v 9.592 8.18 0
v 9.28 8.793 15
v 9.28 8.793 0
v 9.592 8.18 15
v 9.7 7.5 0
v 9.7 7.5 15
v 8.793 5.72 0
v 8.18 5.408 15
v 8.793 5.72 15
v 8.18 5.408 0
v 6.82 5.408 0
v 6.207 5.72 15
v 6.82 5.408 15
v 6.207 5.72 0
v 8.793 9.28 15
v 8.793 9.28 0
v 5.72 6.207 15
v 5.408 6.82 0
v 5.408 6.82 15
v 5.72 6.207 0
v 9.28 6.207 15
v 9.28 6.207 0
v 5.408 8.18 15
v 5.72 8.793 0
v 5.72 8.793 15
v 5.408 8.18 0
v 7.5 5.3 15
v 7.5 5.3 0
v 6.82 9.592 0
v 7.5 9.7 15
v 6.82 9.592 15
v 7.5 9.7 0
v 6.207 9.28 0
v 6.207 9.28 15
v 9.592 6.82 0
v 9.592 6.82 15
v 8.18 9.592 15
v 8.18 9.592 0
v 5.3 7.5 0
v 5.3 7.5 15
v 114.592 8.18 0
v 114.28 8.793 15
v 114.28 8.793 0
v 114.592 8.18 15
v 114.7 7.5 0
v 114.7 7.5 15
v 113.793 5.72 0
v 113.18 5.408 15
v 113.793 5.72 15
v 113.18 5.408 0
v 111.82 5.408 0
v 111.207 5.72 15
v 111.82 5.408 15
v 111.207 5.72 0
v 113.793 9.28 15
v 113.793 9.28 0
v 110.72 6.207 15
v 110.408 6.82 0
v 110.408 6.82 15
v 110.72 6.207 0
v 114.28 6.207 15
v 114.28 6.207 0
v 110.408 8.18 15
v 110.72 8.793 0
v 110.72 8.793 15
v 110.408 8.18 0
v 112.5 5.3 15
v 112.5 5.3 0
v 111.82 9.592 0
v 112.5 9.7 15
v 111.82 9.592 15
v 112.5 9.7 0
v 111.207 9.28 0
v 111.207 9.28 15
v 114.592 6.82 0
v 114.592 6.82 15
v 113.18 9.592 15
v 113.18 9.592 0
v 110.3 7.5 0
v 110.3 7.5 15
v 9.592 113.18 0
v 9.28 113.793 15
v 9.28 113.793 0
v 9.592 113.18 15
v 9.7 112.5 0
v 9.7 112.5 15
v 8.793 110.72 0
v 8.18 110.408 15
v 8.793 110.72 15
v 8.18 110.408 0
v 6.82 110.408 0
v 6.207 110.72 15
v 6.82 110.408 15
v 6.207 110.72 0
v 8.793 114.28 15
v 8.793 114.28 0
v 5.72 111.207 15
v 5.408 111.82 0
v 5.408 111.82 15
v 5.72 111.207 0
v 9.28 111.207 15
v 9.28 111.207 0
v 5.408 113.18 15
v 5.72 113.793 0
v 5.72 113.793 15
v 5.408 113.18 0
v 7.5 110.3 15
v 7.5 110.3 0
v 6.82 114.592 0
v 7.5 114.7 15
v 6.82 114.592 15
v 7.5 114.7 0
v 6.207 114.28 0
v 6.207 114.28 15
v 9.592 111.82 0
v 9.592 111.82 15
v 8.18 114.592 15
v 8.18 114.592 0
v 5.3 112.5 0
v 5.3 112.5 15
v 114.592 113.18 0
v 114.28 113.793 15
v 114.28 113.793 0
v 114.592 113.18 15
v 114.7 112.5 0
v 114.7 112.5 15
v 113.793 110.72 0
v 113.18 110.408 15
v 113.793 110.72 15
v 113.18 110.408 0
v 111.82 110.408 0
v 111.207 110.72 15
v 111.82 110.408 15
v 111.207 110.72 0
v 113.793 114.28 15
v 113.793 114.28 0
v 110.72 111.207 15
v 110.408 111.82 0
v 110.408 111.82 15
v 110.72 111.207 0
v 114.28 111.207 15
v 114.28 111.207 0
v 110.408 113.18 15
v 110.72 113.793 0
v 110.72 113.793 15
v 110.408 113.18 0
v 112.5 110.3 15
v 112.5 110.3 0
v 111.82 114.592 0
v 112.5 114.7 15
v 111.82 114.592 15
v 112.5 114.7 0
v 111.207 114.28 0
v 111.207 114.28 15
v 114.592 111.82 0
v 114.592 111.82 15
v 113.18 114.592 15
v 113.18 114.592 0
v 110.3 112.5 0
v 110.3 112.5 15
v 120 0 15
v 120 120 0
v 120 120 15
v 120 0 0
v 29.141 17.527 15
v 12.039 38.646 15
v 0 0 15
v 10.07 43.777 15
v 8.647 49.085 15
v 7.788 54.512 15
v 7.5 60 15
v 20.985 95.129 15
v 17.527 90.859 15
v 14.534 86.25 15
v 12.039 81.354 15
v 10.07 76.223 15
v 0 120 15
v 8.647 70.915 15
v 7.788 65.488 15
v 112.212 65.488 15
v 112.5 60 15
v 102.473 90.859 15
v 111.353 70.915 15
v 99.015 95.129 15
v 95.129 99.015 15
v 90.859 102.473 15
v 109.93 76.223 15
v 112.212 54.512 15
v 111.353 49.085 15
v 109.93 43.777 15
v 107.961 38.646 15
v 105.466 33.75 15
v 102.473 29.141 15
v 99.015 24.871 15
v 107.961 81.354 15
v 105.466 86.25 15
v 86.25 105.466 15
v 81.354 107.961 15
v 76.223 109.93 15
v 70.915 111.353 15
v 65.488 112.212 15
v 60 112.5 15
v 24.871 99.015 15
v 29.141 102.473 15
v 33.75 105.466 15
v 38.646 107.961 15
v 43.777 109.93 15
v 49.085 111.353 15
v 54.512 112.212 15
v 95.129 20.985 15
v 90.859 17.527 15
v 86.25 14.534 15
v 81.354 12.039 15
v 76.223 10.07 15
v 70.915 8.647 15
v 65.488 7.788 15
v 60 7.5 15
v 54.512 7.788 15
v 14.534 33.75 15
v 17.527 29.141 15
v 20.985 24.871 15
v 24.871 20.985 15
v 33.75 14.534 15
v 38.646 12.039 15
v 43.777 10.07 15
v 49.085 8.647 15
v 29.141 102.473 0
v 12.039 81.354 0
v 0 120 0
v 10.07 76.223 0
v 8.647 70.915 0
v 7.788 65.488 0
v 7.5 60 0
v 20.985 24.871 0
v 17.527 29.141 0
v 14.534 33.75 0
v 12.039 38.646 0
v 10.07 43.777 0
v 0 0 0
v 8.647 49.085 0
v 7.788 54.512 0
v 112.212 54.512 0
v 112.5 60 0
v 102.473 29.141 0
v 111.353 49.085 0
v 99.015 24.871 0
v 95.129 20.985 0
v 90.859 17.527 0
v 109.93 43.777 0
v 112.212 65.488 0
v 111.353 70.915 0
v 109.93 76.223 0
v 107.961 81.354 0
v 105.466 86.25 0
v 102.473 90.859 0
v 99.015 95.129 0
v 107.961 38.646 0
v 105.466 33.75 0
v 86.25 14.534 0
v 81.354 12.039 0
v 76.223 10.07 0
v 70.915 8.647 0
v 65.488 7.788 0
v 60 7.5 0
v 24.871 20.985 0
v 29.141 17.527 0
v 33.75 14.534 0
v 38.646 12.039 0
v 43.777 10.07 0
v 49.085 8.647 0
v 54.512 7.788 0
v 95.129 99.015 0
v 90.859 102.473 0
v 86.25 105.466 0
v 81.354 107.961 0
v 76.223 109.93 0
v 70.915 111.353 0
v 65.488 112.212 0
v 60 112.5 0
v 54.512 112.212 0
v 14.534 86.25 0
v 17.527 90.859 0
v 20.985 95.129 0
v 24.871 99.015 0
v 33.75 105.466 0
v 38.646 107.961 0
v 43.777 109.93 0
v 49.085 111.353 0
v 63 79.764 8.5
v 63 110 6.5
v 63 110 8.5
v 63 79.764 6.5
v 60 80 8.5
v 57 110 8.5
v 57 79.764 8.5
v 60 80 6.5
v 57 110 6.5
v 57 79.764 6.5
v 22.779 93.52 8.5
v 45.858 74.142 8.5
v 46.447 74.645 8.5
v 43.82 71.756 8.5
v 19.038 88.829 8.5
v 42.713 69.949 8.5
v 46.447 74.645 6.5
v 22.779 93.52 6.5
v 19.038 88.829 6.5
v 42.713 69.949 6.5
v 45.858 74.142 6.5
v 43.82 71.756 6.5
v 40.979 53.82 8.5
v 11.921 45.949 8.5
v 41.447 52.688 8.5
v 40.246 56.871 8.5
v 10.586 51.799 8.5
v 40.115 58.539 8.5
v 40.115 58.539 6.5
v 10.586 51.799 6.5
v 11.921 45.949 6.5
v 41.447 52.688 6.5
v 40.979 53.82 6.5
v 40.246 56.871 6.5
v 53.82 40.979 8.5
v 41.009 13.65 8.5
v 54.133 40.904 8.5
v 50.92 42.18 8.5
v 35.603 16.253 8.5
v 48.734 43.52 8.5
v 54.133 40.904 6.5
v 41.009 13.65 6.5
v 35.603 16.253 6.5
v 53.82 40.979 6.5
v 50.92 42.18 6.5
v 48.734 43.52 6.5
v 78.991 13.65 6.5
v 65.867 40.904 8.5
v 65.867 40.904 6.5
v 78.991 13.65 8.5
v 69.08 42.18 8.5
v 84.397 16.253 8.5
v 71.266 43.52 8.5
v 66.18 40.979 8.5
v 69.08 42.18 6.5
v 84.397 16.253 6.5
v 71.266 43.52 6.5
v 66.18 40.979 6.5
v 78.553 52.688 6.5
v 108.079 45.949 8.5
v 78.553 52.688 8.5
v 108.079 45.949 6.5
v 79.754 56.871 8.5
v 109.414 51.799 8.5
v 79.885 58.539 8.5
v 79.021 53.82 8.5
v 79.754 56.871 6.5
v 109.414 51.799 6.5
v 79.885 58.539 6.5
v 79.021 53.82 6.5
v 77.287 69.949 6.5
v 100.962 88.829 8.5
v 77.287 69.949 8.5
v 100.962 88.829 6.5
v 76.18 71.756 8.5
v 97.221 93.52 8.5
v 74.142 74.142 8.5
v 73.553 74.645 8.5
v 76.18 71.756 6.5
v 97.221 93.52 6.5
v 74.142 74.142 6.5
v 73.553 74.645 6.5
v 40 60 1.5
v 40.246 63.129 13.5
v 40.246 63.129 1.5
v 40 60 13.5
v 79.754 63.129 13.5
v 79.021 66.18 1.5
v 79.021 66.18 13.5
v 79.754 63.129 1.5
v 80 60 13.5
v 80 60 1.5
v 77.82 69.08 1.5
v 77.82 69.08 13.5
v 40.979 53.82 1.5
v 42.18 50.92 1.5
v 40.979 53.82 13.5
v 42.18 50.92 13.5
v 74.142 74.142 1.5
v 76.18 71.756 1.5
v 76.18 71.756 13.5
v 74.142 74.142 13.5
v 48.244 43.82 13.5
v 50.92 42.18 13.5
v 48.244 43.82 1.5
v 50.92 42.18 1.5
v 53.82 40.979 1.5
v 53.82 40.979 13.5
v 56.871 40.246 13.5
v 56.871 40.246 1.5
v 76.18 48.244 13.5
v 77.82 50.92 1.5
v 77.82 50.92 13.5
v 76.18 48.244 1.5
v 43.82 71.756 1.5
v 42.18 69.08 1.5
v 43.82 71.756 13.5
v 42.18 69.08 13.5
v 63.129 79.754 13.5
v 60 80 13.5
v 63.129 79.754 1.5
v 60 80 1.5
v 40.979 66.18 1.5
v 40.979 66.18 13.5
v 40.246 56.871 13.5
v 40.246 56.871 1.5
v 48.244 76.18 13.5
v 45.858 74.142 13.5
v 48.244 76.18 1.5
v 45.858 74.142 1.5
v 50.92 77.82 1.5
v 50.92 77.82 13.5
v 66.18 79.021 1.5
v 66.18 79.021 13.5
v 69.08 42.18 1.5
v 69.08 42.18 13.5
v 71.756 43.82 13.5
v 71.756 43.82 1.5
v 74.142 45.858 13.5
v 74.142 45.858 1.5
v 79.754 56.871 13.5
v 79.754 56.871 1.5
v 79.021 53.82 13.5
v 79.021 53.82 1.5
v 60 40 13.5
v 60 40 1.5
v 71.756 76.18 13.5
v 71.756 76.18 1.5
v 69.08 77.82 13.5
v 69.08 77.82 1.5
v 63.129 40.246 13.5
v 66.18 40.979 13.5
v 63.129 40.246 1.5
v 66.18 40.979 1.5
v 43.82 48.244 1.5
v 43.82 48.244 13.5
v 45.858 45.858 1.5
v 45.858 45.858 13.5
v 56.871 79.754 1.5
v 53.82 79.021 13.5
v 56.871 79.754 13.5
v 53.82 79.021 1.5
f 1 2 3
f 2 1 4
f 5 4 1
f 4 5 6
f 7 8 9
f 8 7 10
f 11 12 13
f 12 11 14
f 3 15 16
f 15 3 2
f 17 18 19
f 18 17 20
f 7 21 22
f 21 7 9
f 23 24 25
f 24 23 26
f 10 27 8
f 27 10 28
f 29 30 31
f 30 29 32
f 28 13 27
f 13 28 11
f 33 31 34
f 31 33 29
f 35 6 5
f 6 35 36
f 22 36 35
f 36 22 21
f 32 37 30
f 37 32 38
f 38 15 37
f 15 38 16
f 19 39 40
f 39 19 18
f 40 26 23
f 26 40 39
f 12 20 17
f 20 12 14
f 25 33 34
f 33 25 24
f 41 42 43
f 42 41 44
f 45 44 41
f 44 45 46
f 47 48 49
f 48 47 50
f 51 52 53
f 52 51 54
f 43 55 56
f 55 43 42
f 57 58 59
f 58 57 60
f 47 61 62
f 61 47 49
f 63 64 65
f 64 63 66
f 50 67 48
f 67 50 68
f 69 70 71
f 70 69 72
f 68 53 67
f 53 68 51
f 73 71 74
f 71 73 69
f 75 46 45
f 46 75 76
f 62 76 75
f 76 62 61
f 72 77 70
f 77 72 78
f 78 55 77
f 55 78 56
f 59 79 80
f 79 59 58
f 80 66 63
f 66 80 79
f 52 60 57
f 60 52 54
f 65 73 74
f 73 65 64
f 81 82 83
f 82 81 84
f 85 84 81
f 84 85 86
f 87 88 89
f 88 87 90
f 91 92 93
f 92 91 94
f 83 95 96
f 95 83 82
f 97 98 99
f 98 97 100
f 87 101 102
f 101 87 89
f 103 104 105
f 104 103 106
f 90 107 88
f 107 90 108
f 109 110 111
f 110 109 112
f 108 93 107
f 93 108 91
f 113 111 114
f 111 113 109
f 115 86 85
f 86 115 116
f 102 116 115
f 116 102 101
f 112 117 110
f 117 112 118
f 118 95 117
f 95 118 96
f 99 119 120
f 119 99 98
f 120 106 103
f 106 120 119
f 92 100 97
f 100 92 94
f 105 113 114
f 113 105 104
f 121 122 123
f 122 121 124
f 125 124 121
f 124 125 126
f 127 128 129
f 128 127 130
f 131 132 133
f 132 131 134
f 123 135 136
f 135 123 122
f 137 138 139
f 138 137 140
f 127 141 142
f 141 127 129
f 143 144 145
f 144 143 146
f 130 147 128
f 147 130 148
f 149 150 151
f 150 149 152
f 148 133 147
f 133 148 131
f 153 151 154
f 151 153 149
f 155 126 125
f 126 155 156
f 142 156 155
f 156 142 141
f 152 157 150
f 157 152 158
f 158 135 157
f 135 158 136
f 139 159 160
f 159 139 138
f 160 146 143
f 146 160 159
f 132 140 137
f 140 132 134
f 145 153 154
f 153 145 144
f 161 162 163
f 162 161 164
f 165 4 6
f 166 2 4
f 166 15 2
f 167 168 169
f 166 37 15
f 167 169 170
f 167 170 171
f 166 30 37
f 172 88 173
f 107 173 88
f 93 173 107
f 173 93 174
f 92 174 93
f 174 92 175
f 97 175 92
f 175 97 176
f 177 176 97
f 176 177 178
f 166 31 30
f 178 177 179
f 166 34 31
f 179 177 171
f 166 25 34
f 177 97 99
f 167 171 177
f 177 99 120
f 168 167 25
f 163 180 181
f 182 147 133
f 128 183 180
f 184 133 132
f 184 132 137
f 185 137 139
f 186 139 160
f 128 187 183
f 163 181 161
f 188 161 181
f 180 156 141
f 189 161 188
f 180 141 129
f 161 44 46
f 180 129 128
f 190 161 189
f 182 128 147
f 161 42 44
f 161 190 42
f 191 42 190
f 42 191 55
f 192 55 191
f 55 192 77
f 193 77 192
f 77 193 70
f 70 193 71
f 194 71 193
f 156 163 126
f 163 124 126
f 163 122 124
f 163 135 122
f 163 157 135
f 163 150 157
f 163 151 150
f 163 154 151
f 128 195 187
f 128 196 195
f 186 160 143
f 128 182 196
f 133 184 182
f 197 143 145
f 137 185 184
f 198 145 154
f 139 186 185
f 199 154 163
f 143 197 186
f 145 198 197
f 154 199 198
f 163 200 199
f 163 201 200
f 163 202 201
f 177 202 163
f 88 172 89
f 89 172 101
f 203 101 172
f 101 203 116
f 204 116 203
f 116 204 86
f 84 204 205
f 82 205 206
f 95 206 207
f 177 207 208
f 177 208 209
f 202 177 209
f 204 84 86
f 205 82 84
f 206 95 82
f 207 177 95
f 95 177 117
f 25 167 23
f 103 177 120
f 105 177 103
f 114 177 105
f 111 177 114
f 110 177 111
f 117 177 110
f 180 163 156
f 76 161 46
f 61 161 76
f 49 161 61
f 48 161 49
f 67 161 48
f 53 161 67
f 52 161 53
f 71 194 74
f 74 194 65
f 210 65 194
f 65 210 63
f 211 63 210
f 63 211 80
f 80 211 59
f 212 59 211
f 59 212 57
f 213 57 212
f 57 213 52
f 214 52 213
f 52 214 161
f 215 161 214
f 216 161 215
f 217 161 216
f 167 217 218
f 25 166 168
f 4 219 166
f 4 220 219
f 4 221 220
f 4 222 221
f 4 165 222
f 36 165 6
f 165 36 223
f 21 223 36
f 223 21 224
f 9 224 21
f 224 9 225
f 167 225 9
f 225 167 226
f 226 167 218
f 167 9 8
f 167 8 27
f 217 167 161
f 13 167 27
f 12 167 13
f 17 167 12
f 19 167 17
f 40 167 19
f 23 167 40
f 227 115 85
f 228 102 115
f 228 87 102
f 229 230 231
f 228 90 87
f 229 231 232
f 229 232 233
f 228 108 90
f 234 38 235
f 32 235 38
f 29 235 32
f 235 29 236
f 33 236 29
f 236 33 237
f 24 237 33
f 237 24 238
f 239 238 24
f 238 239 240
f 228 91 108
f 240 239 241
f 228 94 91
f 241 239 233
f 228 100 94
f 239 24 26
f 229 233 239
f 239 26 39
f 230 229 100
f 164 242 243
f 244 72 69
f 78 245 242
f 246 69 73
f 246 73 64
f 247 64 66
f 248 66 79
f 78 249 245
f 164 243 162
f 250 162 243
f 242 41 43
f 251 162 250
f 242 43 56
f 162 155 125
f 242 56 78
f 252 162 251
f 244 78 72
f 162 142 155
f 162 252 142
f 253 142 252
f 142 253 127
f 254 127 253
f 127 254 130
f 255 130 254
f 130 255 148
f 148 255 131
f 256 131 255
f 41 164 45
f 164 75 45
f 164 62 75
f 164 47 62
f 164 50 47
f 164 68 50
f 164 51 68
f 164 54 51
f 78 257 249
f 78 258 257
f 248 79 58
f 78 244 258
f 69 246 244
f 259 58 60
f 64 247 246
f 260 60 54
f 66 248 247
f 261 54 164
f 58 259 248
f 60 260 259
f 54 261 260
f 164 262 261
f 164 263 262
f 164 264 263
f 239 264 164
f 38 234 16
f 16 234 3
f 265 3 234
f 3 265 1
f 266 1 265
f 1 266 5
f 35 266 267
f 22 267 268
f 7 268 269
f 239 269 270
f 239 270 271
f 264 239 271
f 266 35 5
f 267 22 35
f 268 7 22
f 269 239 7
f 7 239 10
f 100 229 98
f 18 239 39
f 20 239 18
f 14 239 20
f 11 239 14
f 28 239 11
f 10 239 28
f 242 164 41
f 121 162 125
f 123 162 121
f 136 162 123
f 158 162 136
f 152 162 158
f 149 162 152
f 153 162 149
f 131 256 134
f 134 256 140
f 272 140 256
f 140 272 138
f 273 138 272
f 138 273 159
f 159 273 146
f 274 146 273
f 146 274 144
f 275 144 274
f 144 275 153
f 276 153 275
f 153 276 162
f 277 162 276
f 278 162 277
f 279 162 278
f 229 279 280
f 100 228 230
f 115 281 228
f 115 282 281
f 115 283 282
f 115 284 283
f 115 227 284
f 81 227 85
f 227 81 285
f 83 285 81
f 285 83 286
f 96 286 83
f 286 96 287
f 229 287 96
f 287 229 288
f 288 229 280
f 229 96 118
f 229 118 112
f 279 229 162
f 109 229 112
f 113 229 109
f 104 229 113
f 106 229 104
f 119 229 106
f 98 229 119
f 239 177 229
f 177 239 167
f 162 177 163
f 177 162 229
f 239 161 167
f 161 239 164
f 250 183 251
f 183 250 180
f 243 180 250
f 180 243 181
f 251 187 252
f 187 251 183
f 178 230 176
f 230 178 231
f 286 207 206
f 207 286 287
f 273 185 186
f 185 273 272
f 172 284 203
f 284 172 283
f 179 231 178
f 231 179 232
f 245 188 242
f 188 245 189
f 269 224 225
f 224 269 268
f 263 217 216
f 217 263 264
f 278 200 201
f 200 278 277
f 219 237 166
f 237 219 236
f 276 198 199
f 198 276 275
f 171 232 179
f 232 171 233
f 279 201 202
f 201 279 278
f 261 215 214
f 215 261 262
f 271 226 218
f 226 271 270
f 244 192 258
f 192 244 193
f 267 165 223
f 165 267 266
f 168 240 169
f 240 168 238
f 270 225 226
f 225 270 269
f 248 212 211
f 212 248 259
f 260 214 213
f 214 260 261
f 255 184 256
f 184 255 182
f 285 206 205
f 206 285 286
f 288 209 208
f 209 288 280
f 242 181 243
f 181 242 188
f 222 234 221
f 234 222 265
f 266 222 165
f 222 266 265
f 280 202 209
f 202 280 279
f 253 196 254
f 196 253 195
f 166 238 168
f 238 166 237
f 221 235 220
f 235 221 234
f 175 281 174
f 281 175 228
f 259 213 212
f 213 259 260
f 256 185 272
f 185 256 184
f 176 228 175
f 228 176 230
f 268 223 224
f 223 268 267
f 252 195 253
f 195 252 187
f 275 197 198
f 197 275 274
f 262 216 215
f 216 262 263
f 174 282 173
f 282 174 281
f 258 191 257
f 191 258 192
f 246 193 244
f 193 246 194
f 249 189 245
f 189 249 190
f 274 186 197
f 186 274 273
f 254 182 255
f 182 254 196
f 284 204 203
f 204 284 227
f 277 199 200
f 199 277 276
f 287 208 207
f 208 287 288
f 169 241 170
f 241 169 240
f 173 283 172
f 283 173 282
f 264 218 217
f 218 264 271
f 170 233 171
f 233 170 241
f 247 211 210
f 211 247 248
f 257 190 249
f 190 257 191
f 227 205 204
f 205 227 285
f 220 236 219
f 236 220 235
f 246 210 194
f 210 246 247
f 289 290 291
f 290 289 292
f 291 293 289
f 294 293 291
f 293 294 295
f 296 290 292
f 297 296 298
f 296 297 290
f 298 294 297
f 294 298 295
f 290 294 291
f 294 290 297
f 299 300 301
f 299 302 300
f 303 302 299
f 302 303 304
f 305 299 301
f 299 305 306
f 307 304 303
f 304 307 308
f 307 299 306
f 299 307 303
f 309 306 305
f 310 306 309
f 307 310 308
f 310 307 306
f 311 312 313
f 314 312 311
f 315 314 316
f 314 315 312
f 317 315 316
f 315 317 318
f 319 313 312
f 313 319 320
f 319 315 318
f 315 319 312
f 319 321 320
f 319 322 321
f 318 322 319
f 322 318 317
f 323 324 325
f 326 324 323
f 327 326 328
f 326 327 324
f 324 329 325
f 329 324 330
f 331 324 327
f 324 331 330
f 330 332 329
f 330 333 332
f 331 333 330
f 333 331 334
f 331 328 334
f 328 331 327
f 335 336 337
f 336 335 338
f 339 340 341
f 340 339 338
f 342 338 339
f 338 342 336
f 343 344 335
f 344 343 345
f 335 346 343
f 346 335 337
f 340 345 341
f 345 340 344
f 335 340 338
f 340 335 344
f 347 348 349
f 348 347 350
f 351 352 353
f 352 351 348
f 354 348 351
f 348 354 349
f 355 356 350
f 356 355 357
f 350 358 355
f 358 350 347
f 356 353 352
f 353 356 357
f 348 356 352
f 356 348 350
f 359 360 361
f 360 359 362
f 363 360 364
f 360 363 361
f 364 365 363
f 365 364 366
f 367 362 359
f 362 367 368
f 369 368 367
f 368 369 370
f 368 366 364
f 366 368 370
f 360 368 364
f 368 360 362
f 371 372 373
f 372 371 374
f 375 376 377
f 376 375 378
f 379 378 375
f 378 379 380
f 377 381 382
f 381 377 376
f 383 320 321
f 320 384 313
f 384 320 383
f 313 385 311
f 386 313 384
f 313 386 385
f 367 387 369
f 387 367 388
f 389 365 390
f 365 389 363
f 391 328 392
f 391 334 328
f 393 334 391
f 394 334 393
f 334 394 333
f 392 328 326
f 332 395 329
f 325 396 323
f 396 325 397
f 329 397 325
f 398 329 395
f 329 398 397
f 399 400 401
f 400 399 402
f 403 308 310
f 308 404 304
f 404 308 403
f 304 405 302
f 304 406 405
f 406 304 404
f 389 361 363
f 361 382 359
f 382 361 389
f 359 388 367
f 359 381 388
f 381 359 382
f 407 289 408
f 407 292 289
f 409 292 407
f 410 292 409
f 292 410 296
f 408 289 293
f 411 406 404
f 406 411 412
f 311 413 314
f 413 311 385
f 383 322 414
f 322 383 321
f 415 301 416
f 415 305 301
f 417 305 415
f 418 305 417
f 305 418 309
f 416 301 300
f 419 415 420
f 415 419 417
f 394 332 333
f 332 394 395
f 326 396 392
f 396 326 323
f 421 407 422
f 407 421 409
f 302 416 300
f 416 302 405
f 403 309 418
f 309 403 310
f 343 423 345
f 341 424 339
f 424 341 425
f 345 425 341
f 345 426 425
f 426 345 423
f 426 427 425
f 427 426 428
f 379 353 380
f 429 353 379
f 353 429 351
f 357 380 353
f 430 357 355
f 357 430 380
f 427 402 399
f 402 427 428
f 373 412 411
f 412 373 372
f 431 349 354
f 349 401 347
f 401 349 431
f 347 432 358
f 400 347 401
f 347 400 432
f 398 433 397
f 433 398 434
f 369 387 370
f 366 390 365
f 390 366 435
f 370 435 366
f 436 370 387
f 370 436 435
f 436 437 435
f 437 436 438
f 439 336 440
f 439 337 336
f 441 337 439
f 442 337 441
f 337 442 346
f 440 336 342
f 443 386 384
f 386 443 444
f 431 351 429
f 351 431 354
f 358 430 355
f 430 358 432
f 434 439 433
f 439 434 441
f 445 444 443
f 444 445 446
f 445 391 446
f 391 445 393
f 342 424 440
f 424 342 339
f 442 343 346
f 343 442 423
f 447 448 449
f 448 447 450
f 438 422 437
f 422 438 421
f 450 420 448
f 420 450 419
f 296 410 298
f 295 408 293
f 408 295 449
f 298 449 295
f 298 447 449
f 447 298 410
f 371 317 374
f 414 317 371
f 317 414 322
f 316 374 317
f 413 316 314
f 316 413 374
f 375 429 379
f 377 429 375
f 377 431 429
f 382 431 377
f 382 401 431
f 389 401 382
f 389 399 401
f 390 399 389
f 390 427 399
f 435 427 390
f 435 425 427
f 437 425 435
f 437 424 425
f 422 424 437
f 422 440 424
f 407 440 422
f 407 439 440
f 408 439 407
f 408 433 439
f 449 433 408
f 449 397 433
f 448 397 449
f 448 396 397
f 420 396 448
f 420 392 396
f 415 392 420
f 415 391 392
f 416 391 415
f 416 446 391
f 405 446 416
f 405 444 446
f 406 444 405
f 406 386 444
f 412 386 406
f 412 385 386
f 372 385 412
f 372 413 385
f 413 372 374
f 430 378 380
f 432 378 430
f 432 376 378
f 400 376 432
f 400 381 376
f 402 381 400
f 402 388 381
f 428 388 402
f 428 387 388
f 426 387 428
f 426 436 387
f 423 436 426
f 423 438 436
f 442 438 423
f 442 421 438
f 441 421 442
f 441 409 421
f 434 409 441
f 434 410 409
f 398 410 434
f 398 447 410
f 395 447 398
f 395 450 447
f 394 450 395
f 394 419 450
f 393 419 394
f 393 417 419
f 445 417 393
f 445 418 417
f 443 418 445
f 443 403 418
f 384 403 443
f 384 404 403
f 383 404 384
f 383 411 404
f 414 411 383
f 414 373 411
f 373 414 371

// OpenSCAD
// 120mm Slim Case Fan Model
// 120x120x15mm fan (NF-A12x15 style)

module fan_120mm_15mm() {
    fan_size = 120;
    fan_thickness = 15;
    hub_diameter = 40;
    mount_hole_inset = 7.5;  // Distance from edge to mount hole center
    mount_hole_radius = 2.2; // ~M4 clearance

    union() {
        color("tan") {
            difference() {
                // Outer frame
                cube([fan_size, fan_size, fan_thickness]);

                // Center opening for airflow
                translate([fan_size/2, fan_size/2, -0.1]) {
                    cylinder(h = fan_thickness + 0.2, r = (fan_size - 15) / 2, $fn = 60);
                }

                // Corner mount holes (standard 105mm spacing)
                mount_positions = [
                    [mount_hole_inset, mount_hole_inset],
                    [fan_size - mount_hole_inset, mount_hole_inset],
                    [mount_hole_inset, fan_size - mount_hole_inset],
                    [fan_size - mount_hole_inset, fan_size - mount_hole_inset]
                ];
                for (pos = mount_positions) {
                    translate([pos[0], pos[1], -0.1]) {
                        cylinder(h = fan_thickness + 0.2, r = mount_hole_radius, $fn = 20);
                    }
                }
            }
        }

        // Hub
        color("black") {
            translate([fan_size/2, fan_size/2, fan_thickness/2]) {
                cylinder(h = fan_thickness - 3, r = hub_diameter/2, center = true, $fn = 40);
            }
        }

        // Blades (simplified)
        color("gray") {
            translate([fan_size/2, fan_size/2, fan_thickness/2]) {
                for (i = [0:6]) {
                    rotate([0, 0, i * 360/7]) {
                        translate([0, 30, 0]) {
                            cube([6, 40, 2], center = true);
                        }
                    }
                }
            }
        }
    }
}

// Preview
fan_120mm_15mm();
